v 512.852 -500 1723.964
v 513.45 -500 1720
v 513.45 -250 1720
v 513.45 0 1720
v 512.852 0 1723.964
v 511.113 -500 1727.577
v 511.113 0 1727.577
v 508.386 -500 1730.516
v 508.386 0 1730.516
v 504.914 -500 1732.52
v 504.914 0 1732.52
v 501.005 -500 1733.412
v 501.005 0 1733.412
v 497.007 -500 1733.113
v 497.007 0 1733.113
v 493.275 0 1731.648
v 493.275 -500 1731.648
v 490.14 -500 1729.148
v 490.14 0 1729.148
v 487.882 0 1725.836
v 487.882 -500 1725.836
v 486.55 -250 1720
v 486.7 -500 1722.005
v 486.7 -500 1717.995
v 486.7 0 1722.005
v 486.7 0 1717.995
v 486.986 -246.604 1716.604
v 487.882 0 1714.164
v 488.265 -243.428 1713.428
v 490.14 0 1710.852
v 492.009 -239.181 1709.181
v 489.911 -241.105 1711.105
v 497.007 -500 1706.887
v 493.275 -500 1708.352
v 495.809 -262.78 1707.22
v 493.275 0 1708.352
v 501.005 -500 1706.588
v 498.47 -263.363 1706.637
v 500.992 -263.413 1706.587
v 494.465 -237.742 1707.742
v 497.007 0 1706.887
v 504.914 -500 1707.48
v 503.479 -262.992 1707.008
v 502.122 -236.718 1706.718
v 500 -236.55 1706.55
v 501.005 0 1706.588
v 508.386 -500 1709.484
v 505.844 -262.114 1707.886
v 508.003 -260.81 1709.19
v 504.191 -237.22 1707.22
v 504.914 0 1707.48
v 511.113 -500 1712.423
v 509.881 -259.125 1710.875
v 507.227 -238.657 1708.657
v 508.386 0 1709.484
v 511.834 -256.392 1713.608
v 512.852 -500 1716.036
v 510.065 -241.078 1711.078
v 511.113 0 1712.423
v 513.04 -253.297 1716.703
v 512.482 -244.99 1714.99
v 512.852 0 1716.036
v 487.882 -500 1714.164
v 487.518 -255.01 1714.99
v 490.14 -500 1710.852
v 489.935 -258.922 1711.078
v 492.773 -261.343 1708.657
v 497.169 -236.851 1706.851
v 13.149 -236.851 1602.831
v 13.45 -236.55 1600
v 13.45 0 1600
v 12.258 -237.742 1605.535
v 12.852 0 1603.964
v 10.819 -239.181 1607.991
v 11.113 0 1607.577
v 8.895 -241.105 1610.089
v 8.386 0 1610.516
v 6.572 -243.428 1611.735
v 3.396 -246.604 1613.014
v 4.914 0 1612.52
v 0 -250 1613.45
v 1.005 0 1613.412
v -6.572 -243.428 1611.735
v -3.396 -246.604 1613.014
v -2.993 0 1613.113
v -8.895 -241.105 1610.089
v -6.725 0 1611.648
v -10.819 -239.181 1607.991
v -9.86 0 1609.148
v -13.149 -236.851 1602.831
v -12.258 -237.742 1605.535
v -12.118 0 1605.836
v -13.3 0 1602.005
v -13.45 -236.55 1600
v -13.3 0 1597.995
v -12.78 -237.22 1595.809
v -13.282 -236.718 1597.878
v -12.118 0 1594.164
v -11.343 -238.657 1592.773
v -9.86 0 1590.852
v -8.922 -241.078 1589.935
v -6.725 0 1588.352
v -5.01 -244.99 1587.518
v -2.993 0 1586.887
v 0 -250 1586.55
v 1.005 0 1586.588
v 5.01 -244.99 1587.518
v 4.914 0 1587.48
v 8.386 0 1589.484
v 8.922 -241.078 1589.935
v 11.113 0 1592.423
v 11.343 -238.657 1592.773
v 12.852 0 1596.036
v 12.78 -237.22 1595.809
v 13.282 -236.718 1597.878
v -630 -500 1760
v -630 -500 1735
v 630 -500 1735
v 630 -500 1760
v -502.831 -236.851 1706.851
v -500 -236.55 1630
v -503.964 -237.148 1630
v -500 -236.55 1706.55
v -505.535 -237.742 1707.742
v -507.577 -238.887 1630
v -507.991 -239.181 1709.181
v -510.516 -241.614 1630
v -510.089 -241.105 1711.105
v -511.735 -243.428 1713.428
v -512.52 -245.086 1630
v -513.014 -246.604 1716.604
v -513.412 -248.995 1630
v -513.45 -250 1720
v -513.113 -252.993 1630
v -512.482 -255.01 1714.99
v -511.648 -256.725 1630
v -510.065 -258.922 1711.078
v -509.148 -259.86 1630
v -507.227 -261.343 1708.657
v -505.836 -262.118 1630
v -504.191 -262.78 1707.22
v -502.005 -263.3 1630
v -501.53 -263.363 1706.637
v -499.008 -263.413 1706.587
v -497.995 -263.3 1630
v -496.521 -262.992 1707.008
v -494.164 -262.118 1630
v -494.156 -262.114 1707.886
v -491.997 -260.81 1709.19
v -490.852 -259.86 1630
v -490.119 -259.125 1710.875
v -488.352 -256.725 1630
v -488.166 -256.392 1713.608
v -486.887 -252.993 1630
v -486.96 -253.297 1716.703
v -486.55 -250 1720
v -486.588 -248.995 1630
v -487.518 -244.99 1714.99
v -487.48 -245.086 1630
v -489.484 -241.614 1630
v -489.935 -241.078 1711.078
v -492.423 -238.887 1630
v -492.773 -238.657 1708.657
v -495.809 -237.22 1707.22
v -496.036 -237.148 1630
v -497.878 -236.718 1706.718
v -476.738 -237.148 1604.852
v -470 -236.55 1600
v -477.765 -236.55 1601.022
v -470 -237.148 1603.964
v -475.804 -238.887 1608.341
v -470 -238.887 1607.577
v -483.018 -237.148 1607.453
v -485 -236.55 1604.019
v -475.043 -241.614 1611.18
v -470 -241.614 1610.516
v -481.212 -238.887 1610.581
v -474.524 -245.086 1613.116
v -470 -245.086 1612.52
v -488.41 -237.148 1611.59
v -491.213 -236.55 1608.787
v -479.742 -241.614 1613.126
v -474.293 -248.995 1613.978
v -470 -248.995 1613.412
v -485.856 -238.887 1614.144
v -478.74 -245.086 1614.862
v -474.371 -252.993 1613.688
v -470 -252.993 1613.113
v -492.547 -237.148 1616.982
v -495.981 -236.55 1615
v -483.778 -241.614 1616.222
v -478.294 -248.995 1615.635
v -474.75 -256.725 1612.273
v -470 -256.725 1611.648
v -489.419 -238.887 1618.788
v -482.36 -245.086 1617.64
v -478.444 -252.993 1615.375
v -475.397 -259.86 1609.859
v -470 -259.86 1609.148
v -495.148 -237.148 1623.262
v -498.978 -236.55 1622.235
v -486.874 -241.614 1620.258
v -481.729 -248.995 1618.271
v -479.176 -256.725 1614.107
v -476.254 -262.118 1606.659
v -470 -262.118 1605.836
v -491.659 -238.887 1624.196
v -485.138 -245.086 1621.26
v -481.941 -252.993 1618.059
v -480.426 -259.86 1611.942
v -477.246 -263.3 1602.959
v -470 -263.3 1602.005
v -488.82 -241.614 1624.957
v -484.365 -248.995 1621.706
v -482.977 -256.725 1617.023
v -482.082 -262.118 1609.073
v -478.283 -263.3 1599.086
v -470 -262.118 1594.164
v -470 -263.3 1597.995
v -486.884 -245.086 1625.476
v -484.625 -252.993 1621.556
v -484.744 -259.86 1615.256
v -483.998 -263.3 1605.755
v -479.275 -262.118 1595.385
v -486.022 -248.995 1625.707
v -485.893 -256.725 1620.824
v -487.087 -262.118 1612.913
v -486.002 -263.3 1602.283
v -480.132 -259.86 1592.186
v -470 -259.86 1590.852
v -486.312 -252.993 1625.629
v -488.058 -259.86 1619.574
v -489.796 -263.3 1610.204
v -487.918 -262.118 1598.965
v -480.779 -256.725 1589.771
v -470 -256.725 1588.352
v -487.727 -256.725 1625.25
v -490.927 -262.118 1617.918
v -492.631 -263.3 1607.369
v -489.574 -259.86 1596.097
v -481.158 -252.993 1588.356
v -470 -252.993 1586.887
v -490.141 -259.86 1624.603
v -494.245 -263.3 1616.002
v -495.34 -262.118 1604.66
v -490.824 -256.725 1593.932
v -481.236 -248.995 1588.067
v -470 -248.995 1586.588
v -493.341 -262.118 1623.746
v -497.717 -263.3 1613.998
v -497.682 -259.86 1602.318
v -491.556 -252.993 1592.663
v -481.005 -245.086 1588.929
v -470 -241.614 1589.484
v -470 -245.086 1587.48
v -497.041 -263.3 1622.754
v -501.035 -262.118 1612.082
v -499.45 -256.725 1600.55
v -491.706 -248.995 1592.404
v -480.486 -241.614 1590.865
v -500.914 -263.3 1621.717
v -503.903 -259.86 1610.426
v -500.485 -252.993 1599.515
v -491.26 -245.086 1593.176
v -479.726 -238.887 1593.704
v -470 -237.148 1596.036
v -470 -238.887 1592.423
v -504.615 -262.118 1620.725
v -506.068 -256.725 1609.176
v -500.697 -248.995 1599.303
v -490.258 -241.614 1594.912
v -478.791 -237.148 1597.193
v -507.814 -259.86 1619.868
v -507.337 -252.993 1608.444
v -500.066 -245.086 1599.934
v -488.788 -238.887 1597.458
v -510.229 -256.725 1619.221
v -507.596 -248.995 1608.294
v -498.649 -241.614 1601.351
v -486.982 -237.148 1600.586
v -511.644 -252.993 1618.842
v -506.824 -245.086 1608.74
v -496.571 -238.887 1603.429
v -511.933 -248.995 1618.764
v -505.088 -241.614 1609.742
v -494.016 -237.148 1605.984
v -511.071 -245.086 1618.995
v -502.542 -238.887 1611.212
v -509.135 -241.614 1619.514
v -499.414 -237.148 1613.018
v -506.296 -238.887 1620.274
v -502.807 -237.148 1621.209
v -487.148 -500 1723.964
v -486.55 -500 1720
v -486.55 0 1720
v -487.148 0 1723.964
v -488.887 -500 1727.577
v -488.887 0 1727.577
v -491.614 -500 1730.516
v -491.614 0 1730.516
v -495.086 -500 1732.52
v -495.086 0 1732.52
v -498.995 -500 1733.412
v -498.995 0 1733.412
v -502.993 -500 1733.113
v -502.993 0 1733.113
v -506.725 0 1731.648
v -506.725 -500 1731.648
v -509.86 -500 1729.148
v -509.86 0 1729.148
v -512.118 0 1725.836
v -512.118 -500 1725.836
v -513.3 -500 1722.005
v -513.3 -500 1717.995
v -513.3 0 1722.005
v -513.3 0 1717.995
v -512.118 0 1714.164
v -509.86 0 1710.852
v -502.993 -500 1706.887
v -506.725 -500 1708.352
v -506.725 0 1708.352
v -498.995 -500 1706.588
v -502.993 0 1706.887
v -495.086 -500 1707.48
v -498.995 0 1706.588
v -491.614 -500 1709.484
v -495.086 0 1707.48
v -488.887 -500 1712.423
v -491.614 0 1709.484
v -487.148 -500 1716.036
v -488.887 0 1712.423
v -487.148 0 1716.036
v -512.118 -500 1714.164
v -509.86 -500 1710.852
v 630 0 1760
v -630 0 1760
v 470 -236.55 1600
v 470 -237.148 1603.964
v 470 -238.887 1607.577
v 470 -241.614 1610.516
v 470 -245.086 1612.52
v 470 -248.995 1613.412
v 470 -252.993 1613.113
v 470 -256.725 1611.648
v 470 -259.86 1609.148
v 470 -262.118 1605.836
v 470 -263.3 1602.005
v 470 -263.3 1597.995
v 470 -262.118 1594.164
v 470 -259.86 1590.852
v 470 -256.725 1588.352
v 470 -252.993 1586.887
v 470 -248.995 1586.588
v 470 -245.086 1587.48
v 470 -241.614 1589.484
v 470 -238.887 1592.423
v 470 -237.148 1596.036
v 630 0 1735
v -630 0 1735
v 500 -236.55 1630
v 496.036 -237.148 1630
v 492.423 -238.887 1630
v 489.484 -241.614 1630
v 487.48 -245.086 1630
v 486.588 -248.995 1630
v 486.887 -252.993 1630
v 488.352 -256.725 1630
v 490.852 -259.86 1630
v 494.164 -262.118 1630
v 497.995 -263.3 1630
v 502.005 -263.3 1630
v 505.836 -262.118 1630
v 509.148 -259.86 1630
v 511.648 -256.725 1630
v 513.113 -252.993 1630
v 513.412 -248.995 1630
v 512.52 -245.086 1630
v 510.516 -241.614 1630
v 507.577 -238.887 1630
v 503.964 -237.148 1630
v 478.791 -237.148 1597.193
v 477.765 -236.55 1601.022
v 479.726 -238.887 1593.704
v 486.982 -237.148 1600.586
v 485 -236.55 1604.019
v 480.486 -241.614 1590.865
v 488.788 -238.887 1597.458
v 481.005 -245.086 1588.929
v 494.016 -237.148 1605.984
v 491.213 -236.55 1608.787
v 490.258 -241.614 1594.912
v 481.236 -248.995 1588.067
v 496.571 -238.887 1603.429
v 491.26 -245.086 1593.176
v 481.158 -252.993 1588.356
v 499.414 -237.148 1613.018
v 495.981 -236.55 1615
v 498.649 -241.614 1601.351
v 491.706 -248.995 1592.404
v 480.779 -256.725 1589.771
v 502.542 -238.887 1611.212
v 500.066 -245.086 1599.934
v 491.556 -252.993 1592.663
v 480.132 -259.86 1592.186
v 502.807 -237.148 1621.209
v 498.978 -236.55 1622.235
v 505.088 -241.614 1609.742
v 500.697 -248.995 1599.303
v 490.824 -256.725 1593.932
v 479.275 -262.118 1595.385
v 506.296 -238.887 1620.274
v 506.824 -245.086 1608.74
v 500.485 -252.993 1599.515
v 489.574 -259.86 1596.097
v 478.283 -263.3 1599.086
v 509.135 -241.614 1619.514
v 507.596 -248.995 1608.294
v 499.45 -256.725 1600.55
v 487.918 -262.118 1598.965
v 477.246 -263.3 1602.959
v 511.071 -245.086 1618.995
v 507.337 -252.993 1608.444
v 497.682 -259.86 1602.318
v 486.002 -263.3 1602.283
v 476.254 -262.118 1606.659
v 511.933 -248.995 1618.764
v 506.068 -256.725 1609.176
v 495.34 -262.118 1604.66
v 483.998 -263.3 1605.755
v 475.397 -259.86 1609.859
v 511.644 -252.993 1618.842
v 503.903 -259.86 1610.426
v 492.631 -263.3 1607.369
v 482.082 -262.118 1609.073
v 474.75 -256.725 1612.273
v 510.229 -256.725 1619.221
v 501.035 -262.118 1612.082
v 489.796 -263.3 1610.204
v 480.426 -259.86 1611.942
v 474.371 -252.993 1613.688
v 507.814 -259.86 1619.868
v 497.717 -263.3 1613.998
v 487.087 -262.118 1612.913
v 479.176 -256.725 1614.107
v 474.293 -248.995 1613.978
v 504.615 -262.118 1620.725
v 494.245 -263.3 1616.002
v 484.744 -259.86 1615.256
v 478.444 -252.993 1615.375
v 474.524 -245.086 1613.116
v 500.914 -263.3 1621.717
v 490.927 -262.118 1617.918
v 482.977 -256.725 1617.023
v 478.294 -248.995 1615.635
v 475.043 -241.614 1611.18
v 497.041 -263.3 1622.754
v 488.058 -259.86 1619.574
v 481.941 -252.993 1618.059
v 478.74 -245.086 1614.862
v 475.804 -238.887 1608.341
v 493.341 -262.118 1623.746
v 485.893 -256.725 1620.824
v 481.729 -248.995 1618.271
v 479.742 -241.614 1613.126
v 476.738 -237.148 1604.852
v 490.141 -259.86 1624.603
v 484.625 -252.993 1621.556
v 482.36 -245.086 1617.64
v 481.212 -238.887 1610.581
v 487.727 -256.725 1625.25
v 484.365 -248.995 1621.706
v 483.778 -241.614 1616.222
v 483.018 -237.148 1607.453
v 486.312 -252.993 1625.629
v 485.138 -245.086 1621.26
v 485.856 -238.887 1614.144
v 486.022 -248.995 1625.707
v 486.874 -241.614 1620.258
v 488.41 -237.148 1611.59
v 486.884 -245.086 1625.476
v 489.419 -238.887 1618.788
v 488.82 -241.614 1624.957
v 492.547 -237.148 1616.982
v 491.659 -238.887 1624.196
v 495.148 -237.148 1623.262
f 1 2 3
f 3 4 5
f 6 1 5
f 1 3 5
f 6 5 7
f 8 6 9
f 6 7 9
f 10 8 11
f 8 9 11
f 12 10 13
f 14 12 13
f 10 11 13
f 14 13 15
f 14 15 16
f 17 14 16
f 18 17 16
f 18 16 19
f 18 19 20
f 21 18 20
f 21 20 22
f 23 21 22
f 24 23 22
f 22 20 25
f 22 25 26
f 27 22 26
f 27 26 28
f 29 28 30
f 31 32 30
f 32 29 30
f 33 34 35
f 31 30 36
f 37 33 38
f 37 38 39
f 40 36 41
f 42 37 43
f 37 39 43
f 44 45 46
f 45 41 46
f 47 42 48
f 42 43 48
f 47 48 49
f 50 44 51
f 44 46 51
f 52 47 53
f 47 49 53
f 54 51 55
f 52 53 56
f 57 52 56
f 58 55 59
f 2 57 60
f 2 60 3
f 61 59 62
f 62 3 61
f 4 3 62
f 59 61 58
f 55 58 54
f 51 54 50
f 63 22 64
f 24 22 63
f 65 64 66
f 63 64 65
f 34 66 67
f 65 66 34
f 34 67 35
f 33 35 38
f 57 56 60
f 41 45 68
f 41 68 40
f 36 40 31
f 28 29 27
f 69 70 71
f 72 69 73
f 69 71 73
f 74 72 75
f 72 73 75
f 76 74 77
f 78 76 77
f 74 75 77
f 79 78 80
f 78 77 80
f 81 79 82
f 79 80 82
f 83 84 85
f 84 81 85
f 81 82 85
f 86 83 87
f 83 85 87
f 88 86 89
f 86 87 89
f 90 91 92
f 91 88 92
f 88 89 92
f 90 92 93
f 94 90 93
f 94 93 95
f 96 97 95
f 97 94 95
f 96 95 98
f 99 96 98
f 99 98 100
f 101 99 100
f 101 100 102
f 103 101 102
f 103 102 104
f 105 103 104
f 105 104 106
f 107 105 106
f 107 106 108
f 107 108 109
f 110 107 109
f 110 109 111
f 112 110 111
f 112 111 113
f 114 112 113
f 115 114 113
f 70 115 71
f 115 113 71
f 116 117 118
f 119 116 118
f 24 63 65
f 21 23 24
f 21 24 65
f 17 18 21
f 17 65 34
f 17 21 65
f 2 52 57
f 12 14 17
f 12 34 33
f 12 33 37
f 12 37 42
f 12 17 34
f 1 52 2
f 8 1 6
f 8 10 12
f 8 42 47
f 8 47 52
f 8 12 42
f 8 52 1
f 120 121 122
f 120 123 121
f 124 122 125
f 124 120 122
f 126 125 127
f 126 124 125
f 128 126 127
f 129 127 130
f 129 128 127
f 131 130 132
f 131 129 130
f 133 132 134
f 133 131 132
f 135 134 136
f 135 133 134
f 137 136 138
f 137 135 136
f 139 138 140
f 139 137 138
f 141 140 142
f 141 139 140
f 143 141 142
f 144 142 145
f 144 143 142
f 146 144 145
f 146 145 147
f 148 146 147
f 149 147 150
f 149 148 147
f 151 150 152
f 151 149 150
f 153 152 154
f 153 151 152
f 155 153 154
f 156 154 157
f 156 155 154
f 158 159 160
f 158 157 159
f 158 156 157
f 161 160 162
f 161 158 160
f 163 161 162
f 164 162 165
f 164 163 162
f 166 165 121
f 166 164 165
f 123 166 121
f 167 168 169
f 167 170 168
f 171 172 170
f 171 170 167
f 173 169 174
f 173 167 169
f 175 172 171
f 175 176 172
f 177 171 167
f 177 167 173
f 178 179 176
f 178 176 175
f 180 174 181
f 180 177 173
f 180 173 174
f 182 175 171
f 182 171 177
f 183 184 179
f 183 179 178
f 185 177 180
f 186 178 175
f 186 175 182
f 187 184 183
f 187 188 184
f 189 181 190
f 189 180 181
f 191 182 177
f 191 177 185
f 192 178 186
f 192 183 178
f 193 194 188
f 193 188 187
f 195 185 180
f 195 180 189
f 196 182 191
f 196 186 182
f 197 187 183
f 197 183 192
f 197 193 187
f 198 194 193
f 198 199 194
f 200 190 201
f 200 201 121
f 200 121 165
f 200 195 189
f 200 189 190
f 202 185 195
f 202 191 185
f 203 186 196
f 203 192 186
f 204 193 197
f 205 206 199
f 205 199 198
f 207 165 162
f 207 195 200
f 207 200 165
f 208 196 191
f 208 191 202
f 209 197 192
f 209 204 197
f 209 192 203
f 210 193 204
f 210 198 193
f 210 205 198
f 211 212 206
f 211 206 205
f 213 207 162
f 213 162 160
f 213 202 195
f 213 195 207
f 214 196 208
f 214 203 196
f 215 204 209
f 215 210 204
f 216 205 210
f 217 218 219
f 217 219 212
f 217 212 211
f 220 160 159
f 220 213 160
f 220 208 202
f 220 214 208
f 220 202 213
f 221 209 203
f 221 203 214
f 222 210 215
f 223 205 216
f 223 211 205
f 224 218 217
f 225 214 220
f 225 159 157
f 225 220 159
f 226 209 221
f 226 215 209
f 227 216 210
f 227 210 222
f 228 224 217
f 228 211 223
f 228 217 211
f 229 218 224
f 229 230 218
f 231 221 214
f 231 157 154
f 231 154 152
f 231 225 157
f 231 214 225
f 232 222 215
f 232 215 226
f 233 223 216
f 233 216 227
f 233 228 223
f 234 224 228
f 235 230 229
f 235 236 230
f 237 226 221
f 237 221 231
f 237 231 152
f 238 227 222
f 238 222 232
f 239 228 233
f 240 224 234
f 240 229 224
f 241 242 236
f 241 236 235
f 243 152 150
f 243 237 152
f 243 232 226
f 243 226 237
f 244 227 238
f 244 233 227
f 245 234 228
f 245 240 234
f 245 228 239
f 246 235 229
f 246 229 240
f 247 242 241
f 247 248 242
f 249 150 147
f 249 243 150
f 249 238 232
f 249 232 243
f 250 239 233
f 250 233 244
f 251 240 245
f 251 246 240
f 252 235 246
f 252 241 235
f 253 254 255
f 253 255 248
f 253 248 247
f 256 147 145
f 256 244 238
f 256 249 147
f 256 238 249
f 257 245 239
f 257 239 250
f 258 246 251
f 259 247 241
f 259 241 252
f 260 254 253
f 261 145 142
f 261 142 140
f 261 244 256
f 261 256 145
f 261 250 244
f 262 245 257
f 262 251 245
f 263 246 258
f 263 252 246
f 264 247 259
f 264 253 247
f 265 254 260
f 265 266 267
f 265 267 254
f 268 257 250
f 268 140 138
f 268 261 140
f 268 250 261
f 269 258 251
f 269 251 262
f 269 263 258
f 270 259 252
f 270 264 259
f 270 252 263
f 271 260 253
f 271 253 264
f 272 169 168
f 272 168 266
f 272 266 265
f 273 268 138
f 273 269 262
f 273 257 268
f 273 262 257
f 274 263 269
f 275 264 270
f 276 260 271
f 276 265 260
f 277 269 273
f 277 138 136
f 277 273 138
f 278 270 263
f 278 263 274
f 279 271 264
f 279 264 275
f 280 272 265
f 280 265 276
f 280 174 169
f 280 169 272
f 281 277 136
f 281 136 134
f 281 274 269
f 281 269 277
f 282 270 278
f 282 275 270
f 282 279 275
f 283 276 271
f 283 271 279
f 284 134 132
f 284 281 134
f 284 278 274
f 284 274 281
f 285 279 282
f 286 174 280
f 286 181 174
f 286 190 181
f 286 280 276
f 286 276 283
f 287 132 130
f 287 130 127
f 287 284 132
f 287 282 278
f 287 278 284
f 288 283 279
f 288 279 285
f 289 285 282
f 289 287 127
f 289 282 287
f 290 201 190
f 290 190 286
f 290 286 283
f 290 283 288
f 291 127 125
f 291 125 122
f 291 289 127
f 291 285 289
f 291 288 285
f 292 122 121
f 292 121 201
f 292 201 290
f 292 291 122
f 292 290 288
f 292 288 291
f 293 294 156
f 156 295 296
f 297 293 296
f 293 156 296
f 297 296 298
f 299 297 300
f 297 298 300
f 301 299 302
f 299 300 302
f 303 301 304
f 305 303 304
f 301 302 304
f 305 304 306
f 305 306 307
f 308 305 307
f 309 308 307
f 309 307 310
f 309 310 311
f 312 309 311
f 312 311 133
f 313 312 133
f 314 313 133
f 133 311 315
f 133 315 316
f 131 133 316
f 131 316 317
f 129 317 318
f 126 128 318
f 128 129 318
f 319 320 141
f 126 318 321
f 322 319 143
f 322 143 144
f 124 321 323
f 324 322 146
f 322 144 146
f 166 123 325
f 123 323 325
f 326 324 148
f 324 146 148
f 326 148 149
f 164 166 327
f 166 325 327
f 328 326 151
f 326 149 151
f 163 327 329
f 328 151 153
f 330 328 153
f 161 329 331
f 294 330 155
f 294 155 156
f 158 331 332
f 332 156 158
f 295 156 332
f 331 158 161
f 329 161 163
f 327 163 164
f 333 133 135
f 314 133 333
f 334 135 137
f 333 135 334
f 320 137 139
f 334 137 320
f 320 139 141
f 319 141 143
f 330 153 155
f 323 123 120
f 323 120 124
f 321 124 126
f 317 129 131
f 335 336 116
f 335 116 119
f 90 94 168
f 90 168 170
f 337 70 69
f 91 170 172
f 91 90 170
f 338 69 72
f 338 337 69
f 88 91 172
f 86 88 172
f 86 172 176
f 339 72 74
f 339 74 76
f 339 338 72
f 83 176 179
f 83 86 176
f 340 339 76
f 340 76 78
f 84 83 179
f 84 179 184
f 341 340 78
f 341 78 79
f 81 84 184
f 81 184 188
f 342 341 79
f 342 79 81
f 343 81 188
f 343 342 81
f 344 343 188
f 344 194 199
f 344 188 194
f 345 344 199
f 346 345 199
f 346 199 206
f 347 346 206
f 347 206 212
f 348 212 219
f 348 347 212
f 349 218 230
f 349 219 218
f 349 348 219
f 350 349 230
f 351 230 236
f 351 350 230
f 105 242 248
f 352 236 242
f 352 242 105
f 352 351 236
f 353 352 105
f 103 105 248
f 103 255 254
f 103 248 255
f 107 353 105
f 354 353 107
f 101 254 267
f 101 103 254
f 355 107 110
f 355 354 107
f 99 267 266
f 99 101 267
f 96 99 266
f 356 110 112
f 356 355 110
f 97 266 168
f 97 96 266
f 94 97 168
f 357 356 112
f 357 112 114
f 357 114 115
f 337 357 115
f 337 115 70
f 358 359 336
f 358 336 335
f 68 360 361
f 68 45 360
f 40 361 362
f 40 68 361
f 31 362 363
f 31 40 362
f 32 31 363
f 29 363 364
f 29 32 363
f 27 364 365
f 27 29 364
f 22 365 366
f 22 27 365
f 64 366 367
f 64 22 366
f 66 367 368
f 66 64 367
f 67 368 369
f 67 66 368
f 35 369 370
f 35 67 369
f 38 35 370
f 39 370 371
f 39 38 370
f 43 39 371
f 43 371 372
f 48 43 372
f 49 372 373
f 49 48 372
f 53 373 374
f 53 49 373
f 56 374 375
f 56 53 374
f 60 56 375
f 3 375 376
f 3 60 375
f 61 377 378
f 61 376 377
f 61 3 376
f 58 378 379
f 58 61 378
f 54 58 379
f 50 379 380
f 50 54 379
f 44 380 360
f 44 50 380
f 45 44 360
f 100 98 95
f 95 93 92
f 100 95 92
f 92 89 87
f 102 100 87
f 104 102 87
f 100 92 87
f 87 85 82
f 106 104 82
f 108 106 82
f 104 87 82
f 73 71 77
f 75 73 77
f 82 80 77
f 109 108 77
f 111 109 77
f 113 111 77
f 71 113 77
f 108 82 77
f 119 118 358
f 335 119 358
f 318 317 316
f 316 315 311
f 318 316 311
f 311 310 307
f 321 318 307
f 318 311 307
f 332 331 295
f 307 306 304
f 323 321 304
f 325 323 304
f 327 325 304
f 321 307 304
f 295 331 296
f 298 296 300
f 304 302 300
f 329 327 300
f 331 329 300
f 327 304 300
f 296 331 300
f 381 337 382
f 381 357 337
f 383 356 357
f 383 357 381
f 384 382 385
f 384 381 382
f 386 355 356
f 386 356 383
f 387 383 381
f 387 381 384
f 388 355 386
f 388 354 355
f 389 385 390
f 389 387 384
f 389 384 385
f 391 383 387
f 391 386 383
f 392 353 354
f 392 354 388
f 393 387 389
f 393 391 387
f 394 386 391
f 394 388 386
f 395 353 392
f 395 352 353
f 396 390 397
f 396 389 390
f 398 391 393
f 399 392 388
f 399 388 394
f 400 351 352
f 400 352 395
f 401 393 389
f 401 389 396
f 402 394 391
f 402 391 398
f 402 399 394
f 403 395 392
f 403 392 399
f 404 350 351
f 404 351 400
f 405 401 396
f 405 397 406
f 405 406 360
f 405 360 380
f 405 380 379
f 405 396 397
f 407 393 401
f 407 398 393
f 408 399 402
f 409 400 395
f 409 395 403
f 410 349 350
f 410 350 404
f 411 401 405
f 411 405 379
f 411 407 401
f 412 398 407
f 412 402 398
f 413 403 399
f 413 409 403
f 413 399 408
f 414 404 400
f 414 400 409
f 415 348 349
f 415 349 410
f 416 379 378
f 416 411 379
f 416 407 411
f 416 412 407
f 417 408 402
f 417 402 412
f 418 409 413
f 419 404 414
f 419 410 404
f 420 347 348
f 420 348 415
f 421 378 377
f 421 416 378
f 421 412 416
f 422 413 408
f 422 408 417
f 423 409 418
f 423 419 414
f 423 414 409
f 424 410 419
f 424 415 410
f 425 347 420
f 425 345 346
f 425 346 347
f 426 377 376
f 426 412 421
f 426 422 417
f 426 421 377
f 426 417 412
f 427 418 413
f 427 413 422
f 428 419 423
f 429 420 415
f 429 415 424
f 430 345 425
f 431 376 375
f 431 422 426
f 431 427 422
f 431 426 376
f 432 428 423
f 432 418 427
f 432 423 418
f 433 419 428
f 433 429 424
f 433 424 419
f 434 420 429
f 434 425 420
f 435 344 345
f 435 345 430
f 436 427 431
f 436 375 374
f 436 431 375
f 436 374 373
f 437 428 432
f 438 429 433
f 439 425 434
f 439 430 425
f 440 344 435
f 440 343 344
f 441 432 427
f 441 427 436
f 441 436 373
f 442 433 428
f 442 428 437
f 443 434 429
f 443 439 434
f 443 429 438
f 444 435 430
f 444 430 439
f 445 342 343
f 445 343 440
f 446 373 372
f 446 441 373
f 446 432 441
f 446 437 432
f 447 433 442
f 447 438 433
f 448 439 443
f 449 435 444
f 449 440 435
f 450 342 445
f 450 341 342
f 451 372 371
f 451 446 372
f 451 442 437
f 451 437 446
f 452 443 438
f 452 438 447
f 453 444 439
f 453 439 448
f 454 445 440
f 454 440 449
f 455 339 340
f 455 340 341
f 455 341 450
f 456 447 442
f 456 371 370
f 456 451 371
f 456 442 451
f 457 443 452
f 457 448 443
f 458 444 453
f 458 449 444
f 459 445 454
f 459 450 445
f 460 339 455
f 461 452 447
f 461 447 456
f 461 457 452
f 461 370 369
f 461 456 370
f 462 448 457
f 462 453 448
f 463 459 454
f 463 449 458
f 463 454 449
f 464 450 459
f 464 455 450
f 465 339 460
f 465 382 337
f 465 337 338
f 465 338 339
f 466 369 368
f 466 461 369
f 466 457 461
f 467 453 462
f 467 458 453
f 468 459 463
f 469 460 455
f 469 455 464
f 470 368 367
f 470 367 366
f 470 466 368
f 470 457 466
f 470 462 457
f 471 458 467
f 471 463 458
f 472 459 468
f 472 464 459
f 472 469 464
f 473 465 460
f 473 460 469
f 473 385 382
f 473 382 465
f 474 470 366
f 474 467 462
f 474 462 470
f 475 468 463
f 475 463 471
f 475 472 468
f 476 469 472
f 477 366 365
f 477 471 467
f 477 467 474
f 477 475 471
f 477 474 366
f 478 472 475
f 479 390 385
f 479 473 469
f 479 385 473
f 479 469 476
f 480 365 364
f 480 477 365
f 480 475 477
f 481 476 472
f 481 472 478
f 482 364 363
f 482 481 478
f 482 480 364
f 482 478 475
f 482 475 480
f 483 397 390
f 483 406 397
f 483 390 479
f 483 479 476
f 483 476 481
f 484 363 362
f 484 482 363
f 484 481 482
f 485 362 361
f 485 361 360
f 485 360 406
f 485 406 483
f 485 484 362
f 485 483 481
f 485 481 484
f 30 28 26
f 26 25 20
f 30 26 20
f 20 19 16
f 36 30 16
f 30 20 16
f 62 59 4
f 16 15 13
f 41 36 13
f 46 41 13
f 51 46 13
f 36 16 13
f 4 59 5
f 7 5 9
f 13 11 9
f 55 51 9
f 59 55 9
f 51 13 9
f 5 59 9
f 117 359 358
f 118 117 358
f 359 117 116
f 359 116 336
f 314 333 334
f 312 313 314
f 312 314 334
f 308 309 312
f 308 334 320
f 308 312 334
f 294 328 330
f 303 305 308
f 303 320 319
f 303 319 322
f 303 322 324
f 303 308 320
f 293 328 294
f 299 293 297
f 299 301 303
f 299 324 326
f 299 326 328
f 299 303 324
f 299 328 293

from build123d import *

# Parameters (mm, degrees)
F7_R      = 13.45
F10_R     = 13.45
F12_DEPTH = 500
F13_W     = 1260
F13_H     = 500
F14_DEPTH = 60
F15_DEPTH = 35


with BuildPart() as f8:
    # F8: sweep along a path in F4
    with BuildLine(Plane.XZ.offset(250)) as f8_path:
        Line((0, 1600), (-470, 1600))
        ThreePointArc((-470, 1600), (-491.2132034356, 1608.7867965644), (-500, 1630))
        Line((-500, 1630), (-500, 1720))
    # F7 (on Right) → F8 (sweep)
    with BuildSketch(Plane.YZ):
        with Locations((-250, 1600)):
            Circle(F7_R)
    sweep(path=f8_path.line)

    # F9: sweep along a path in F4
    with BuildLine(Plane.XZ.offset(250)) as f9_path:
        Line((0, 1600), (470, 1600))
        ThreePointArc((470, 1600), (491.2132034356, 1608.7867965644), (500, 1630))
        Line((500, 1630), (500, 1720))
    # F7 (on Right) → F9 (sweep)
    with BuildSketch(Plane.YZ):
        with Locations((-250, 1600)):
            Circle(F7_R)
    sweep(path=f9_path.line)

    # F10 (on face) → F11 (join, up to the next surface of F8)
    with BuildSketch(Plane.XZ):
        with Locations((0, 1600)):
            Circle(F10_R)
    extrude(until=Until.NEXT)

    # F10 (on face) → F12 (join)
    with BuildSketch(Plane.XZ):
        with Locations((-500, 1720)):
            Circle(F10_R)
        with Locations((500, 1720)):
            Circle(F10_R)
    extrude(amount=F12_DEPTH)


with BuildPart() as f14:
    # F13 (on offset) → F14 (new body)
    with BuildSketch(Plane.XY.offset(1700)):
        with Locations((0, -250)):
            Rectangle(F13_W, F13_H)
    extrude(amount=F14_DEPTH)

    # F13 (on offset) → F15 (cut)
    with BuildSketch(Plane.XY.offset(1700)):
        with Locations((0, -250)):
            Rectangle(F13_W, F13_H)
    extrude(amount=F15_DEPTH, mode=Mode.SUBTRACT)


solid = Compound([f8.part, f14.part])
